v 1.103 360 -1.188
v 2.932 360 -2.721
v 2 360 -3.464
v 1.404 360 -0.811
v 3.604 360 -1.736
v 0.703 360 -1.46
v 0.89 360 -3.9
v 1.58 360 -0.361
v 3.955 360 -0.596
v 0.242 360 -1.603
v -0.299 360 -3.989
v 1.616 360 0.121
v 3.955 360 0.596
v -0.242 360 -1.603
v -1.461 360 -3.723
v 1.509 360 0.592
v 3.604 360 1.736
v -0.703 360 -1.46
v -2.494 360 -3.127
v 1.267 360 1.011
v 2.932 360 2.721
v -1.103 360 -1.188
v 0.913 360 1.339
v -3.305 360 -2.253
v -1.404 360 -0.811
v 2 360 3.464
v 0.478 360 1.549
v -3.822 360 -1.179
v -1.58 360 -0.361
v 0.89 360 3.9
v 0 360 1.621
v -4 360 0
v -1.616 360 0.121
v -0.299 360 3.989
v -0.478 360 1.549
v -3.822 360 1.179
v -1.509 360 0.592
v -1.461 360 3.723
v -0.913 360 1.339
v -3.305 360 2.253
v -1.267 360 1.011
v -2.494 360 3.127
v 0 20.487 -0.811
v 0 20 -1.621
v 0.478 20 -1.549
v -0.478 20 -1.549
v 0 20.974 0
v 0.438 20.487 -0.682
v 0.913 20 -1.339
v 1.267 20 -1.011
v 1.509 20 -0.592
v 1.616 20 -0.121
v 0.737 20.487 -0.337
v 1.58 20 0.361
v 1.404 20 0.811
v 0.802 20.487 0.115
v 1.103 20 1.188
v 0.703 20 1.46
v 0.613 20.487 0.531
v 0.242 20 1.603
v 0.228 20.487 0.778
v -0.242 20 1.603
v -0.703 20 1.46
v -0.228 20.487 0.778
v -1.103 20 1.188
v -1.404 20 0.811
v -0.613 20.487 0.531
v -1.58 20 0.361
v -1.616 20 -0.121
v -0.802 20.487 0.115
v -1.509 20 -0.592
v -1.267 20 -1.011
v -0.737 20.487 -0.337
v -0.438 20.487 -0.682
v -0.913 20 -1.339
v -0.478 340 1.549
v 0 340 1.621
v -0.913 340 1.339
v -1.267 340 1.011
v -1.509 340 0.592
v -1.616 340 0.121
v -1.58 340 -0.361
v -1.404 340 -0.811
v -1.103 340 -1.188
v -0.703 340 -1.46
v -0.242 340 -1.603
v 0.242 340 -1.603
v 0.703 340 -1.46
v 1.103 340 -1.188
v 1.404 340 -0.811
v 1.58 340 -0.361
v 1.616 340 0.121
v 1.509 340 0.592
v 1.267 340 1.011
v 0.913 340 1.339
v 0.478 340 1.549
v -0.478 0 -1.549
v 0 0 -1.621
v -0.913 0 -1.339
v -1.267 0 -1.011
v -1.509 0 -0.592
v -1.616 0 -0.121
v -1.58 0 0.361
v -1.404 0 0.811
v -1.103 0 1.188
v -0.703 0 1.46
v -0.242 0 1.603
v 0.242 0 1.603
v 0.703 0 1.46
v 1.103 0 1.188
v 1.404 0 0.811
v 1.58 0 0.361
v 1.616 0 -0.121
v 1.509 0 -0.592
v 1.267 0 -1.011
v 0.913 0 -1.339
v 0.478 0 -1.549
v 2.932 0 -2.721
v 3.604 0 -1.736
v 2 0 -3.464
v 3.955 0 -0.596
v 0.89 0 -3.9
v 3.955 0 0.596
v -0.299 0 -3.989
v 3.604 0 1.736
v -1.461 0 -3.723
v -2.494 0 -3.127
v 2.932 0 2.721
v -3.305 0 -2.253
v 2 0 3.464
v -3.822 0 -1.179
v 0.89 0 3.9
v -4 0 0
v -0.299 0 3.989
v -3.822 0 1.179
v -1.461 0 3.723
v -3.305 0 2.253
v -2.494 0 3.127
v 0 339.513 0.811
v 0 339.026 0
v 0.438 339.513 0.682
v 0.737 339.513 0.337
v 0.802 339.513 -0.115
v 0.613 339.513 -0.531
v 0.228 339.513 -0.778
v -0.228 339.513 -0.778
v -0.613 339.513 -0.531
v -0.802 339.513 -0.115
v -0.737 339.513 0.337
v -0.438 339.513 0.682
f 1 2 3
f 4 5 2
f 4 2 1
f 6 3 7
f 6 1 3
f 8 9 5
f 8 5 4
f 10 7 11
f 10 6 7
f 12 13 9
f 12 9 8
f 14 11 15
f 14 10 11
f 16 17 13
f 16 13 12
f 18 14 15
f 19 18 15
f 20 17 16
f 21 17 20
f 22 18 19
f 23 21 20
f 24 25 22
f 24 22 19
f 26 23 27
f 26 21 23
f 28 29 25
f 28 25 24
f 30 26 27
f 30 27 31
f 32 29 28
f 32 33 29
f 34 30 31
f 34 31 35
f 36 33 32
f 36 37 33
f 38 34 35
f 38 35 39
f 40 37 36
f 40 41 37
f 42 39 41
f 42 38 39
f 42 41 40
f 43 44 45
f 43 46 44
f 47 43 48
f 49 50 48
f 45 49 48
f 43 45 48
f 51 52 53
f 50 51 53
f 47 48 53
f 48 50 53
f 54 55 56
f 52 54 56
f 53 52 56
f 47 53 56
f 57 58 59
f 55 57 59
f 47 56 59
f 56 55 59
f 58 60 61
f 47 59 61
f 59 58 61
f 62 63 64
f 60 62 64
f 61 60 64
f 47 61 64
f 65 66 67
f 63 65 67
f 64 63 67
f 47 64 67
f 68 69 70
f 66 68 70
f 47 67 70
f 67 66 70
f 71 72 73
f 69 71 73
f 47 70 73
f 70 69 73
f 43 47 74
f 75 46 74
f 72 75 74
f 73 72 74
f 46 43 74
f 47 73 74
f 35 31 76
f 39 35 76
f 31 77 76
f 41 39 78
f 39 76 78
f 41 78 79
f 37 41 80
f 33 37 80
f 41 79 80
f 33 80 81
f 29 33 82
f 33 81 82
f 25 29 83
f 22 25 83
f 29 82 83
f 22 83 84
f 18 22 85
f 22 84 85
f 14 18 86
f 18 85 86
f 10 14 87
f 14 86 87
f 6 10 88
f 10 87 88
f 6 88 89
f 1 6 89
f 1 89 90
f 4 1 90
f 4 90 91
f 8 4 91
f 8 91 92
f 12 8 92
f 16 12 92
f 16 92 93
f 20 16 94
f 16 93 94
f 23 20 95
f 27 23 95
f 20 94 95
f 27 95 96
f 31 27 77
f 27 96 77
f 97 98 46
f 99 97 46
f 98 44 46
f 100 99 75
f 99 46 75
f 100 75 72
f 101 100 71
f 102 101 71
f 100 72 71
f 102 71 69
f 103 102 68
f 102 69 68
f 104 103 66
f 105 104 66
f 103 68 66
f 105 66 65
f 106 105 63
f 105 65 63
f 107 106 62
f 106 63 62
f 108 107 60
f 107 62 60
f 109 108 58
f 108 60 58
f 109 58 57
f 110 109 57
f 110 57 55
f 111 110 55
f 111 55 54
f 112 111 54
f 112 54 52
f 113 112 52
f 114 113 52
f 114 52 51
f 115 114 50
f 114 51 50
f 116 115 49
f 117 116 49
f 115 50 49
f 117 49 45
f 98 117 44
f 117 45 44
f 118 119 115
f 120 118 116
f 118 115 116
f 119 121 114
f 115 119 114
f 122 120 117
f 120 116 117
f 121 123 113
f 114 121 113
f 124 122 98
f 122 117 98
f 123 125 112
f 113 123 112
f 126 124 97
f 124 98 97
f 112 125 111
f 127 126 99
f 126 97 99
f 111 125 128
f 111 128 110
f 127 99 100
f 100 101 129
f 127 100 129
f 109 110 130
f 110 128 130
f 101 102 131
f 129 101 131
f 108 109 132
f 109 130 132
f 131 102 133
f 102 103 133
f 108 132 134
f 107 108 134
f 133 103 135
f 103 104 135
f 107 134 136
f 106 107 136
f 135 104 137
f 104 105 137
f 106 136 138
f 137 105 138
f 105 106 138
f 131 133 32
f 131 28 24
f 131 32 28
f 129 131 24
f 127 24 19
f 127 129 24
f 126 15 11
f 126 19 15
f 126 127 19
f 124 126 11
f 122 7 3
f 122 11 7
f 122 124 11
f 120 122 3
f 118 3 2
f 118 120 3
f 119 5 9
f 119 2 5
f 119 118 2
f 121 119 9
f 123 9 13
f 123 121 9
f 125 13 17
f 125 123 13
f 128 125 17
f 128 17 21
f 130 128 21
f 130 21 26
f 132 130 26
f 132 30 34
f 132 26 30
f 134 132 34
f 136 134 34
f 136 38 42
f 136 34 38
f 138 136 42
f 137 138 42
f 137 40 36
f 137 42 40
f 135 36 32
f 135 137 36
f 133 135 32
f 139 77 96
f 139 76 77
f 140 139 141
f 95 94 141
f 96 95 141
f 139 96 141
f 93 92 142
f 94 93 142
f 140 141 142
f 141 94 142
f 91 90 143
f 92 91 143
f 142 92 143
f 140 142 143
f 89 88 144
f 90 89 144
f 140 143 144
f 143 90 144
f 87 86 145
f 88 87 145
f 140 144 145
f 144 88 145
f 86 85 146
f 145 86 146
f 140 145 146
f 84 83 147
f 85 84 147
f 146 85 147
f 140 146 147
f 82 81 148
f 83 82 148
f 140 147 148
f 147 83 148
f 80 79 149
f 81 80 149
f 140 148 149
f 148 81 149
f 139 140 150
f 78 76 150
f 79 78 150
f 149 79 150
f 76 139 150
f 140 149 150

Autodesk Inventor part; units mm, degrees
ref_plane "YZ Plane" through (0, 0, 0) normal (1, 0, 0) x (0, 1, 0)
ref_plane "XZ Plane" through (0, 0, 0) normal (0, 1, 0) x (-1, 0, 0)
ref_plane "XY Plane" through (0, 0, 0) normal (0, 0, 1) x (1, 0, 0)
sketch "Sketch1" plane through (0, 0, 0) normal (0, 1, 0) x (-1, 0, 0)
  circle A0 centre (0, 0) radius 4
  dimension "d0" = 8
extrude "Extrusion1" add sketch "Sketch1" along normal blind 360
sketch "Sketch2" plane through (0, 360, 0) normal (0, 1, 0) x (1, 0, 0)
  point P0 (0, 0)
hole "Hole1" at (0, 360, 0) direction (0, -1, 0) diameter 3.242 depth 20 tip angle 118 thread size "M4x0.7" class "6H" standard "ISO Metric profile"
sketch "Sketch3" plane through (0, 0, 0) normal (0, -1, 0) x (1, 0, 0)
  point P0 (0, 0)
hole "Hole2" at (0, 0, 0) direction (0, 1, 0) diameter 3.242 depth 20 tip angle 118 thread size "M4x0.7" class "6H" standard "ISO Metric profile"
properties part number "Stange_8mm_400mm"
